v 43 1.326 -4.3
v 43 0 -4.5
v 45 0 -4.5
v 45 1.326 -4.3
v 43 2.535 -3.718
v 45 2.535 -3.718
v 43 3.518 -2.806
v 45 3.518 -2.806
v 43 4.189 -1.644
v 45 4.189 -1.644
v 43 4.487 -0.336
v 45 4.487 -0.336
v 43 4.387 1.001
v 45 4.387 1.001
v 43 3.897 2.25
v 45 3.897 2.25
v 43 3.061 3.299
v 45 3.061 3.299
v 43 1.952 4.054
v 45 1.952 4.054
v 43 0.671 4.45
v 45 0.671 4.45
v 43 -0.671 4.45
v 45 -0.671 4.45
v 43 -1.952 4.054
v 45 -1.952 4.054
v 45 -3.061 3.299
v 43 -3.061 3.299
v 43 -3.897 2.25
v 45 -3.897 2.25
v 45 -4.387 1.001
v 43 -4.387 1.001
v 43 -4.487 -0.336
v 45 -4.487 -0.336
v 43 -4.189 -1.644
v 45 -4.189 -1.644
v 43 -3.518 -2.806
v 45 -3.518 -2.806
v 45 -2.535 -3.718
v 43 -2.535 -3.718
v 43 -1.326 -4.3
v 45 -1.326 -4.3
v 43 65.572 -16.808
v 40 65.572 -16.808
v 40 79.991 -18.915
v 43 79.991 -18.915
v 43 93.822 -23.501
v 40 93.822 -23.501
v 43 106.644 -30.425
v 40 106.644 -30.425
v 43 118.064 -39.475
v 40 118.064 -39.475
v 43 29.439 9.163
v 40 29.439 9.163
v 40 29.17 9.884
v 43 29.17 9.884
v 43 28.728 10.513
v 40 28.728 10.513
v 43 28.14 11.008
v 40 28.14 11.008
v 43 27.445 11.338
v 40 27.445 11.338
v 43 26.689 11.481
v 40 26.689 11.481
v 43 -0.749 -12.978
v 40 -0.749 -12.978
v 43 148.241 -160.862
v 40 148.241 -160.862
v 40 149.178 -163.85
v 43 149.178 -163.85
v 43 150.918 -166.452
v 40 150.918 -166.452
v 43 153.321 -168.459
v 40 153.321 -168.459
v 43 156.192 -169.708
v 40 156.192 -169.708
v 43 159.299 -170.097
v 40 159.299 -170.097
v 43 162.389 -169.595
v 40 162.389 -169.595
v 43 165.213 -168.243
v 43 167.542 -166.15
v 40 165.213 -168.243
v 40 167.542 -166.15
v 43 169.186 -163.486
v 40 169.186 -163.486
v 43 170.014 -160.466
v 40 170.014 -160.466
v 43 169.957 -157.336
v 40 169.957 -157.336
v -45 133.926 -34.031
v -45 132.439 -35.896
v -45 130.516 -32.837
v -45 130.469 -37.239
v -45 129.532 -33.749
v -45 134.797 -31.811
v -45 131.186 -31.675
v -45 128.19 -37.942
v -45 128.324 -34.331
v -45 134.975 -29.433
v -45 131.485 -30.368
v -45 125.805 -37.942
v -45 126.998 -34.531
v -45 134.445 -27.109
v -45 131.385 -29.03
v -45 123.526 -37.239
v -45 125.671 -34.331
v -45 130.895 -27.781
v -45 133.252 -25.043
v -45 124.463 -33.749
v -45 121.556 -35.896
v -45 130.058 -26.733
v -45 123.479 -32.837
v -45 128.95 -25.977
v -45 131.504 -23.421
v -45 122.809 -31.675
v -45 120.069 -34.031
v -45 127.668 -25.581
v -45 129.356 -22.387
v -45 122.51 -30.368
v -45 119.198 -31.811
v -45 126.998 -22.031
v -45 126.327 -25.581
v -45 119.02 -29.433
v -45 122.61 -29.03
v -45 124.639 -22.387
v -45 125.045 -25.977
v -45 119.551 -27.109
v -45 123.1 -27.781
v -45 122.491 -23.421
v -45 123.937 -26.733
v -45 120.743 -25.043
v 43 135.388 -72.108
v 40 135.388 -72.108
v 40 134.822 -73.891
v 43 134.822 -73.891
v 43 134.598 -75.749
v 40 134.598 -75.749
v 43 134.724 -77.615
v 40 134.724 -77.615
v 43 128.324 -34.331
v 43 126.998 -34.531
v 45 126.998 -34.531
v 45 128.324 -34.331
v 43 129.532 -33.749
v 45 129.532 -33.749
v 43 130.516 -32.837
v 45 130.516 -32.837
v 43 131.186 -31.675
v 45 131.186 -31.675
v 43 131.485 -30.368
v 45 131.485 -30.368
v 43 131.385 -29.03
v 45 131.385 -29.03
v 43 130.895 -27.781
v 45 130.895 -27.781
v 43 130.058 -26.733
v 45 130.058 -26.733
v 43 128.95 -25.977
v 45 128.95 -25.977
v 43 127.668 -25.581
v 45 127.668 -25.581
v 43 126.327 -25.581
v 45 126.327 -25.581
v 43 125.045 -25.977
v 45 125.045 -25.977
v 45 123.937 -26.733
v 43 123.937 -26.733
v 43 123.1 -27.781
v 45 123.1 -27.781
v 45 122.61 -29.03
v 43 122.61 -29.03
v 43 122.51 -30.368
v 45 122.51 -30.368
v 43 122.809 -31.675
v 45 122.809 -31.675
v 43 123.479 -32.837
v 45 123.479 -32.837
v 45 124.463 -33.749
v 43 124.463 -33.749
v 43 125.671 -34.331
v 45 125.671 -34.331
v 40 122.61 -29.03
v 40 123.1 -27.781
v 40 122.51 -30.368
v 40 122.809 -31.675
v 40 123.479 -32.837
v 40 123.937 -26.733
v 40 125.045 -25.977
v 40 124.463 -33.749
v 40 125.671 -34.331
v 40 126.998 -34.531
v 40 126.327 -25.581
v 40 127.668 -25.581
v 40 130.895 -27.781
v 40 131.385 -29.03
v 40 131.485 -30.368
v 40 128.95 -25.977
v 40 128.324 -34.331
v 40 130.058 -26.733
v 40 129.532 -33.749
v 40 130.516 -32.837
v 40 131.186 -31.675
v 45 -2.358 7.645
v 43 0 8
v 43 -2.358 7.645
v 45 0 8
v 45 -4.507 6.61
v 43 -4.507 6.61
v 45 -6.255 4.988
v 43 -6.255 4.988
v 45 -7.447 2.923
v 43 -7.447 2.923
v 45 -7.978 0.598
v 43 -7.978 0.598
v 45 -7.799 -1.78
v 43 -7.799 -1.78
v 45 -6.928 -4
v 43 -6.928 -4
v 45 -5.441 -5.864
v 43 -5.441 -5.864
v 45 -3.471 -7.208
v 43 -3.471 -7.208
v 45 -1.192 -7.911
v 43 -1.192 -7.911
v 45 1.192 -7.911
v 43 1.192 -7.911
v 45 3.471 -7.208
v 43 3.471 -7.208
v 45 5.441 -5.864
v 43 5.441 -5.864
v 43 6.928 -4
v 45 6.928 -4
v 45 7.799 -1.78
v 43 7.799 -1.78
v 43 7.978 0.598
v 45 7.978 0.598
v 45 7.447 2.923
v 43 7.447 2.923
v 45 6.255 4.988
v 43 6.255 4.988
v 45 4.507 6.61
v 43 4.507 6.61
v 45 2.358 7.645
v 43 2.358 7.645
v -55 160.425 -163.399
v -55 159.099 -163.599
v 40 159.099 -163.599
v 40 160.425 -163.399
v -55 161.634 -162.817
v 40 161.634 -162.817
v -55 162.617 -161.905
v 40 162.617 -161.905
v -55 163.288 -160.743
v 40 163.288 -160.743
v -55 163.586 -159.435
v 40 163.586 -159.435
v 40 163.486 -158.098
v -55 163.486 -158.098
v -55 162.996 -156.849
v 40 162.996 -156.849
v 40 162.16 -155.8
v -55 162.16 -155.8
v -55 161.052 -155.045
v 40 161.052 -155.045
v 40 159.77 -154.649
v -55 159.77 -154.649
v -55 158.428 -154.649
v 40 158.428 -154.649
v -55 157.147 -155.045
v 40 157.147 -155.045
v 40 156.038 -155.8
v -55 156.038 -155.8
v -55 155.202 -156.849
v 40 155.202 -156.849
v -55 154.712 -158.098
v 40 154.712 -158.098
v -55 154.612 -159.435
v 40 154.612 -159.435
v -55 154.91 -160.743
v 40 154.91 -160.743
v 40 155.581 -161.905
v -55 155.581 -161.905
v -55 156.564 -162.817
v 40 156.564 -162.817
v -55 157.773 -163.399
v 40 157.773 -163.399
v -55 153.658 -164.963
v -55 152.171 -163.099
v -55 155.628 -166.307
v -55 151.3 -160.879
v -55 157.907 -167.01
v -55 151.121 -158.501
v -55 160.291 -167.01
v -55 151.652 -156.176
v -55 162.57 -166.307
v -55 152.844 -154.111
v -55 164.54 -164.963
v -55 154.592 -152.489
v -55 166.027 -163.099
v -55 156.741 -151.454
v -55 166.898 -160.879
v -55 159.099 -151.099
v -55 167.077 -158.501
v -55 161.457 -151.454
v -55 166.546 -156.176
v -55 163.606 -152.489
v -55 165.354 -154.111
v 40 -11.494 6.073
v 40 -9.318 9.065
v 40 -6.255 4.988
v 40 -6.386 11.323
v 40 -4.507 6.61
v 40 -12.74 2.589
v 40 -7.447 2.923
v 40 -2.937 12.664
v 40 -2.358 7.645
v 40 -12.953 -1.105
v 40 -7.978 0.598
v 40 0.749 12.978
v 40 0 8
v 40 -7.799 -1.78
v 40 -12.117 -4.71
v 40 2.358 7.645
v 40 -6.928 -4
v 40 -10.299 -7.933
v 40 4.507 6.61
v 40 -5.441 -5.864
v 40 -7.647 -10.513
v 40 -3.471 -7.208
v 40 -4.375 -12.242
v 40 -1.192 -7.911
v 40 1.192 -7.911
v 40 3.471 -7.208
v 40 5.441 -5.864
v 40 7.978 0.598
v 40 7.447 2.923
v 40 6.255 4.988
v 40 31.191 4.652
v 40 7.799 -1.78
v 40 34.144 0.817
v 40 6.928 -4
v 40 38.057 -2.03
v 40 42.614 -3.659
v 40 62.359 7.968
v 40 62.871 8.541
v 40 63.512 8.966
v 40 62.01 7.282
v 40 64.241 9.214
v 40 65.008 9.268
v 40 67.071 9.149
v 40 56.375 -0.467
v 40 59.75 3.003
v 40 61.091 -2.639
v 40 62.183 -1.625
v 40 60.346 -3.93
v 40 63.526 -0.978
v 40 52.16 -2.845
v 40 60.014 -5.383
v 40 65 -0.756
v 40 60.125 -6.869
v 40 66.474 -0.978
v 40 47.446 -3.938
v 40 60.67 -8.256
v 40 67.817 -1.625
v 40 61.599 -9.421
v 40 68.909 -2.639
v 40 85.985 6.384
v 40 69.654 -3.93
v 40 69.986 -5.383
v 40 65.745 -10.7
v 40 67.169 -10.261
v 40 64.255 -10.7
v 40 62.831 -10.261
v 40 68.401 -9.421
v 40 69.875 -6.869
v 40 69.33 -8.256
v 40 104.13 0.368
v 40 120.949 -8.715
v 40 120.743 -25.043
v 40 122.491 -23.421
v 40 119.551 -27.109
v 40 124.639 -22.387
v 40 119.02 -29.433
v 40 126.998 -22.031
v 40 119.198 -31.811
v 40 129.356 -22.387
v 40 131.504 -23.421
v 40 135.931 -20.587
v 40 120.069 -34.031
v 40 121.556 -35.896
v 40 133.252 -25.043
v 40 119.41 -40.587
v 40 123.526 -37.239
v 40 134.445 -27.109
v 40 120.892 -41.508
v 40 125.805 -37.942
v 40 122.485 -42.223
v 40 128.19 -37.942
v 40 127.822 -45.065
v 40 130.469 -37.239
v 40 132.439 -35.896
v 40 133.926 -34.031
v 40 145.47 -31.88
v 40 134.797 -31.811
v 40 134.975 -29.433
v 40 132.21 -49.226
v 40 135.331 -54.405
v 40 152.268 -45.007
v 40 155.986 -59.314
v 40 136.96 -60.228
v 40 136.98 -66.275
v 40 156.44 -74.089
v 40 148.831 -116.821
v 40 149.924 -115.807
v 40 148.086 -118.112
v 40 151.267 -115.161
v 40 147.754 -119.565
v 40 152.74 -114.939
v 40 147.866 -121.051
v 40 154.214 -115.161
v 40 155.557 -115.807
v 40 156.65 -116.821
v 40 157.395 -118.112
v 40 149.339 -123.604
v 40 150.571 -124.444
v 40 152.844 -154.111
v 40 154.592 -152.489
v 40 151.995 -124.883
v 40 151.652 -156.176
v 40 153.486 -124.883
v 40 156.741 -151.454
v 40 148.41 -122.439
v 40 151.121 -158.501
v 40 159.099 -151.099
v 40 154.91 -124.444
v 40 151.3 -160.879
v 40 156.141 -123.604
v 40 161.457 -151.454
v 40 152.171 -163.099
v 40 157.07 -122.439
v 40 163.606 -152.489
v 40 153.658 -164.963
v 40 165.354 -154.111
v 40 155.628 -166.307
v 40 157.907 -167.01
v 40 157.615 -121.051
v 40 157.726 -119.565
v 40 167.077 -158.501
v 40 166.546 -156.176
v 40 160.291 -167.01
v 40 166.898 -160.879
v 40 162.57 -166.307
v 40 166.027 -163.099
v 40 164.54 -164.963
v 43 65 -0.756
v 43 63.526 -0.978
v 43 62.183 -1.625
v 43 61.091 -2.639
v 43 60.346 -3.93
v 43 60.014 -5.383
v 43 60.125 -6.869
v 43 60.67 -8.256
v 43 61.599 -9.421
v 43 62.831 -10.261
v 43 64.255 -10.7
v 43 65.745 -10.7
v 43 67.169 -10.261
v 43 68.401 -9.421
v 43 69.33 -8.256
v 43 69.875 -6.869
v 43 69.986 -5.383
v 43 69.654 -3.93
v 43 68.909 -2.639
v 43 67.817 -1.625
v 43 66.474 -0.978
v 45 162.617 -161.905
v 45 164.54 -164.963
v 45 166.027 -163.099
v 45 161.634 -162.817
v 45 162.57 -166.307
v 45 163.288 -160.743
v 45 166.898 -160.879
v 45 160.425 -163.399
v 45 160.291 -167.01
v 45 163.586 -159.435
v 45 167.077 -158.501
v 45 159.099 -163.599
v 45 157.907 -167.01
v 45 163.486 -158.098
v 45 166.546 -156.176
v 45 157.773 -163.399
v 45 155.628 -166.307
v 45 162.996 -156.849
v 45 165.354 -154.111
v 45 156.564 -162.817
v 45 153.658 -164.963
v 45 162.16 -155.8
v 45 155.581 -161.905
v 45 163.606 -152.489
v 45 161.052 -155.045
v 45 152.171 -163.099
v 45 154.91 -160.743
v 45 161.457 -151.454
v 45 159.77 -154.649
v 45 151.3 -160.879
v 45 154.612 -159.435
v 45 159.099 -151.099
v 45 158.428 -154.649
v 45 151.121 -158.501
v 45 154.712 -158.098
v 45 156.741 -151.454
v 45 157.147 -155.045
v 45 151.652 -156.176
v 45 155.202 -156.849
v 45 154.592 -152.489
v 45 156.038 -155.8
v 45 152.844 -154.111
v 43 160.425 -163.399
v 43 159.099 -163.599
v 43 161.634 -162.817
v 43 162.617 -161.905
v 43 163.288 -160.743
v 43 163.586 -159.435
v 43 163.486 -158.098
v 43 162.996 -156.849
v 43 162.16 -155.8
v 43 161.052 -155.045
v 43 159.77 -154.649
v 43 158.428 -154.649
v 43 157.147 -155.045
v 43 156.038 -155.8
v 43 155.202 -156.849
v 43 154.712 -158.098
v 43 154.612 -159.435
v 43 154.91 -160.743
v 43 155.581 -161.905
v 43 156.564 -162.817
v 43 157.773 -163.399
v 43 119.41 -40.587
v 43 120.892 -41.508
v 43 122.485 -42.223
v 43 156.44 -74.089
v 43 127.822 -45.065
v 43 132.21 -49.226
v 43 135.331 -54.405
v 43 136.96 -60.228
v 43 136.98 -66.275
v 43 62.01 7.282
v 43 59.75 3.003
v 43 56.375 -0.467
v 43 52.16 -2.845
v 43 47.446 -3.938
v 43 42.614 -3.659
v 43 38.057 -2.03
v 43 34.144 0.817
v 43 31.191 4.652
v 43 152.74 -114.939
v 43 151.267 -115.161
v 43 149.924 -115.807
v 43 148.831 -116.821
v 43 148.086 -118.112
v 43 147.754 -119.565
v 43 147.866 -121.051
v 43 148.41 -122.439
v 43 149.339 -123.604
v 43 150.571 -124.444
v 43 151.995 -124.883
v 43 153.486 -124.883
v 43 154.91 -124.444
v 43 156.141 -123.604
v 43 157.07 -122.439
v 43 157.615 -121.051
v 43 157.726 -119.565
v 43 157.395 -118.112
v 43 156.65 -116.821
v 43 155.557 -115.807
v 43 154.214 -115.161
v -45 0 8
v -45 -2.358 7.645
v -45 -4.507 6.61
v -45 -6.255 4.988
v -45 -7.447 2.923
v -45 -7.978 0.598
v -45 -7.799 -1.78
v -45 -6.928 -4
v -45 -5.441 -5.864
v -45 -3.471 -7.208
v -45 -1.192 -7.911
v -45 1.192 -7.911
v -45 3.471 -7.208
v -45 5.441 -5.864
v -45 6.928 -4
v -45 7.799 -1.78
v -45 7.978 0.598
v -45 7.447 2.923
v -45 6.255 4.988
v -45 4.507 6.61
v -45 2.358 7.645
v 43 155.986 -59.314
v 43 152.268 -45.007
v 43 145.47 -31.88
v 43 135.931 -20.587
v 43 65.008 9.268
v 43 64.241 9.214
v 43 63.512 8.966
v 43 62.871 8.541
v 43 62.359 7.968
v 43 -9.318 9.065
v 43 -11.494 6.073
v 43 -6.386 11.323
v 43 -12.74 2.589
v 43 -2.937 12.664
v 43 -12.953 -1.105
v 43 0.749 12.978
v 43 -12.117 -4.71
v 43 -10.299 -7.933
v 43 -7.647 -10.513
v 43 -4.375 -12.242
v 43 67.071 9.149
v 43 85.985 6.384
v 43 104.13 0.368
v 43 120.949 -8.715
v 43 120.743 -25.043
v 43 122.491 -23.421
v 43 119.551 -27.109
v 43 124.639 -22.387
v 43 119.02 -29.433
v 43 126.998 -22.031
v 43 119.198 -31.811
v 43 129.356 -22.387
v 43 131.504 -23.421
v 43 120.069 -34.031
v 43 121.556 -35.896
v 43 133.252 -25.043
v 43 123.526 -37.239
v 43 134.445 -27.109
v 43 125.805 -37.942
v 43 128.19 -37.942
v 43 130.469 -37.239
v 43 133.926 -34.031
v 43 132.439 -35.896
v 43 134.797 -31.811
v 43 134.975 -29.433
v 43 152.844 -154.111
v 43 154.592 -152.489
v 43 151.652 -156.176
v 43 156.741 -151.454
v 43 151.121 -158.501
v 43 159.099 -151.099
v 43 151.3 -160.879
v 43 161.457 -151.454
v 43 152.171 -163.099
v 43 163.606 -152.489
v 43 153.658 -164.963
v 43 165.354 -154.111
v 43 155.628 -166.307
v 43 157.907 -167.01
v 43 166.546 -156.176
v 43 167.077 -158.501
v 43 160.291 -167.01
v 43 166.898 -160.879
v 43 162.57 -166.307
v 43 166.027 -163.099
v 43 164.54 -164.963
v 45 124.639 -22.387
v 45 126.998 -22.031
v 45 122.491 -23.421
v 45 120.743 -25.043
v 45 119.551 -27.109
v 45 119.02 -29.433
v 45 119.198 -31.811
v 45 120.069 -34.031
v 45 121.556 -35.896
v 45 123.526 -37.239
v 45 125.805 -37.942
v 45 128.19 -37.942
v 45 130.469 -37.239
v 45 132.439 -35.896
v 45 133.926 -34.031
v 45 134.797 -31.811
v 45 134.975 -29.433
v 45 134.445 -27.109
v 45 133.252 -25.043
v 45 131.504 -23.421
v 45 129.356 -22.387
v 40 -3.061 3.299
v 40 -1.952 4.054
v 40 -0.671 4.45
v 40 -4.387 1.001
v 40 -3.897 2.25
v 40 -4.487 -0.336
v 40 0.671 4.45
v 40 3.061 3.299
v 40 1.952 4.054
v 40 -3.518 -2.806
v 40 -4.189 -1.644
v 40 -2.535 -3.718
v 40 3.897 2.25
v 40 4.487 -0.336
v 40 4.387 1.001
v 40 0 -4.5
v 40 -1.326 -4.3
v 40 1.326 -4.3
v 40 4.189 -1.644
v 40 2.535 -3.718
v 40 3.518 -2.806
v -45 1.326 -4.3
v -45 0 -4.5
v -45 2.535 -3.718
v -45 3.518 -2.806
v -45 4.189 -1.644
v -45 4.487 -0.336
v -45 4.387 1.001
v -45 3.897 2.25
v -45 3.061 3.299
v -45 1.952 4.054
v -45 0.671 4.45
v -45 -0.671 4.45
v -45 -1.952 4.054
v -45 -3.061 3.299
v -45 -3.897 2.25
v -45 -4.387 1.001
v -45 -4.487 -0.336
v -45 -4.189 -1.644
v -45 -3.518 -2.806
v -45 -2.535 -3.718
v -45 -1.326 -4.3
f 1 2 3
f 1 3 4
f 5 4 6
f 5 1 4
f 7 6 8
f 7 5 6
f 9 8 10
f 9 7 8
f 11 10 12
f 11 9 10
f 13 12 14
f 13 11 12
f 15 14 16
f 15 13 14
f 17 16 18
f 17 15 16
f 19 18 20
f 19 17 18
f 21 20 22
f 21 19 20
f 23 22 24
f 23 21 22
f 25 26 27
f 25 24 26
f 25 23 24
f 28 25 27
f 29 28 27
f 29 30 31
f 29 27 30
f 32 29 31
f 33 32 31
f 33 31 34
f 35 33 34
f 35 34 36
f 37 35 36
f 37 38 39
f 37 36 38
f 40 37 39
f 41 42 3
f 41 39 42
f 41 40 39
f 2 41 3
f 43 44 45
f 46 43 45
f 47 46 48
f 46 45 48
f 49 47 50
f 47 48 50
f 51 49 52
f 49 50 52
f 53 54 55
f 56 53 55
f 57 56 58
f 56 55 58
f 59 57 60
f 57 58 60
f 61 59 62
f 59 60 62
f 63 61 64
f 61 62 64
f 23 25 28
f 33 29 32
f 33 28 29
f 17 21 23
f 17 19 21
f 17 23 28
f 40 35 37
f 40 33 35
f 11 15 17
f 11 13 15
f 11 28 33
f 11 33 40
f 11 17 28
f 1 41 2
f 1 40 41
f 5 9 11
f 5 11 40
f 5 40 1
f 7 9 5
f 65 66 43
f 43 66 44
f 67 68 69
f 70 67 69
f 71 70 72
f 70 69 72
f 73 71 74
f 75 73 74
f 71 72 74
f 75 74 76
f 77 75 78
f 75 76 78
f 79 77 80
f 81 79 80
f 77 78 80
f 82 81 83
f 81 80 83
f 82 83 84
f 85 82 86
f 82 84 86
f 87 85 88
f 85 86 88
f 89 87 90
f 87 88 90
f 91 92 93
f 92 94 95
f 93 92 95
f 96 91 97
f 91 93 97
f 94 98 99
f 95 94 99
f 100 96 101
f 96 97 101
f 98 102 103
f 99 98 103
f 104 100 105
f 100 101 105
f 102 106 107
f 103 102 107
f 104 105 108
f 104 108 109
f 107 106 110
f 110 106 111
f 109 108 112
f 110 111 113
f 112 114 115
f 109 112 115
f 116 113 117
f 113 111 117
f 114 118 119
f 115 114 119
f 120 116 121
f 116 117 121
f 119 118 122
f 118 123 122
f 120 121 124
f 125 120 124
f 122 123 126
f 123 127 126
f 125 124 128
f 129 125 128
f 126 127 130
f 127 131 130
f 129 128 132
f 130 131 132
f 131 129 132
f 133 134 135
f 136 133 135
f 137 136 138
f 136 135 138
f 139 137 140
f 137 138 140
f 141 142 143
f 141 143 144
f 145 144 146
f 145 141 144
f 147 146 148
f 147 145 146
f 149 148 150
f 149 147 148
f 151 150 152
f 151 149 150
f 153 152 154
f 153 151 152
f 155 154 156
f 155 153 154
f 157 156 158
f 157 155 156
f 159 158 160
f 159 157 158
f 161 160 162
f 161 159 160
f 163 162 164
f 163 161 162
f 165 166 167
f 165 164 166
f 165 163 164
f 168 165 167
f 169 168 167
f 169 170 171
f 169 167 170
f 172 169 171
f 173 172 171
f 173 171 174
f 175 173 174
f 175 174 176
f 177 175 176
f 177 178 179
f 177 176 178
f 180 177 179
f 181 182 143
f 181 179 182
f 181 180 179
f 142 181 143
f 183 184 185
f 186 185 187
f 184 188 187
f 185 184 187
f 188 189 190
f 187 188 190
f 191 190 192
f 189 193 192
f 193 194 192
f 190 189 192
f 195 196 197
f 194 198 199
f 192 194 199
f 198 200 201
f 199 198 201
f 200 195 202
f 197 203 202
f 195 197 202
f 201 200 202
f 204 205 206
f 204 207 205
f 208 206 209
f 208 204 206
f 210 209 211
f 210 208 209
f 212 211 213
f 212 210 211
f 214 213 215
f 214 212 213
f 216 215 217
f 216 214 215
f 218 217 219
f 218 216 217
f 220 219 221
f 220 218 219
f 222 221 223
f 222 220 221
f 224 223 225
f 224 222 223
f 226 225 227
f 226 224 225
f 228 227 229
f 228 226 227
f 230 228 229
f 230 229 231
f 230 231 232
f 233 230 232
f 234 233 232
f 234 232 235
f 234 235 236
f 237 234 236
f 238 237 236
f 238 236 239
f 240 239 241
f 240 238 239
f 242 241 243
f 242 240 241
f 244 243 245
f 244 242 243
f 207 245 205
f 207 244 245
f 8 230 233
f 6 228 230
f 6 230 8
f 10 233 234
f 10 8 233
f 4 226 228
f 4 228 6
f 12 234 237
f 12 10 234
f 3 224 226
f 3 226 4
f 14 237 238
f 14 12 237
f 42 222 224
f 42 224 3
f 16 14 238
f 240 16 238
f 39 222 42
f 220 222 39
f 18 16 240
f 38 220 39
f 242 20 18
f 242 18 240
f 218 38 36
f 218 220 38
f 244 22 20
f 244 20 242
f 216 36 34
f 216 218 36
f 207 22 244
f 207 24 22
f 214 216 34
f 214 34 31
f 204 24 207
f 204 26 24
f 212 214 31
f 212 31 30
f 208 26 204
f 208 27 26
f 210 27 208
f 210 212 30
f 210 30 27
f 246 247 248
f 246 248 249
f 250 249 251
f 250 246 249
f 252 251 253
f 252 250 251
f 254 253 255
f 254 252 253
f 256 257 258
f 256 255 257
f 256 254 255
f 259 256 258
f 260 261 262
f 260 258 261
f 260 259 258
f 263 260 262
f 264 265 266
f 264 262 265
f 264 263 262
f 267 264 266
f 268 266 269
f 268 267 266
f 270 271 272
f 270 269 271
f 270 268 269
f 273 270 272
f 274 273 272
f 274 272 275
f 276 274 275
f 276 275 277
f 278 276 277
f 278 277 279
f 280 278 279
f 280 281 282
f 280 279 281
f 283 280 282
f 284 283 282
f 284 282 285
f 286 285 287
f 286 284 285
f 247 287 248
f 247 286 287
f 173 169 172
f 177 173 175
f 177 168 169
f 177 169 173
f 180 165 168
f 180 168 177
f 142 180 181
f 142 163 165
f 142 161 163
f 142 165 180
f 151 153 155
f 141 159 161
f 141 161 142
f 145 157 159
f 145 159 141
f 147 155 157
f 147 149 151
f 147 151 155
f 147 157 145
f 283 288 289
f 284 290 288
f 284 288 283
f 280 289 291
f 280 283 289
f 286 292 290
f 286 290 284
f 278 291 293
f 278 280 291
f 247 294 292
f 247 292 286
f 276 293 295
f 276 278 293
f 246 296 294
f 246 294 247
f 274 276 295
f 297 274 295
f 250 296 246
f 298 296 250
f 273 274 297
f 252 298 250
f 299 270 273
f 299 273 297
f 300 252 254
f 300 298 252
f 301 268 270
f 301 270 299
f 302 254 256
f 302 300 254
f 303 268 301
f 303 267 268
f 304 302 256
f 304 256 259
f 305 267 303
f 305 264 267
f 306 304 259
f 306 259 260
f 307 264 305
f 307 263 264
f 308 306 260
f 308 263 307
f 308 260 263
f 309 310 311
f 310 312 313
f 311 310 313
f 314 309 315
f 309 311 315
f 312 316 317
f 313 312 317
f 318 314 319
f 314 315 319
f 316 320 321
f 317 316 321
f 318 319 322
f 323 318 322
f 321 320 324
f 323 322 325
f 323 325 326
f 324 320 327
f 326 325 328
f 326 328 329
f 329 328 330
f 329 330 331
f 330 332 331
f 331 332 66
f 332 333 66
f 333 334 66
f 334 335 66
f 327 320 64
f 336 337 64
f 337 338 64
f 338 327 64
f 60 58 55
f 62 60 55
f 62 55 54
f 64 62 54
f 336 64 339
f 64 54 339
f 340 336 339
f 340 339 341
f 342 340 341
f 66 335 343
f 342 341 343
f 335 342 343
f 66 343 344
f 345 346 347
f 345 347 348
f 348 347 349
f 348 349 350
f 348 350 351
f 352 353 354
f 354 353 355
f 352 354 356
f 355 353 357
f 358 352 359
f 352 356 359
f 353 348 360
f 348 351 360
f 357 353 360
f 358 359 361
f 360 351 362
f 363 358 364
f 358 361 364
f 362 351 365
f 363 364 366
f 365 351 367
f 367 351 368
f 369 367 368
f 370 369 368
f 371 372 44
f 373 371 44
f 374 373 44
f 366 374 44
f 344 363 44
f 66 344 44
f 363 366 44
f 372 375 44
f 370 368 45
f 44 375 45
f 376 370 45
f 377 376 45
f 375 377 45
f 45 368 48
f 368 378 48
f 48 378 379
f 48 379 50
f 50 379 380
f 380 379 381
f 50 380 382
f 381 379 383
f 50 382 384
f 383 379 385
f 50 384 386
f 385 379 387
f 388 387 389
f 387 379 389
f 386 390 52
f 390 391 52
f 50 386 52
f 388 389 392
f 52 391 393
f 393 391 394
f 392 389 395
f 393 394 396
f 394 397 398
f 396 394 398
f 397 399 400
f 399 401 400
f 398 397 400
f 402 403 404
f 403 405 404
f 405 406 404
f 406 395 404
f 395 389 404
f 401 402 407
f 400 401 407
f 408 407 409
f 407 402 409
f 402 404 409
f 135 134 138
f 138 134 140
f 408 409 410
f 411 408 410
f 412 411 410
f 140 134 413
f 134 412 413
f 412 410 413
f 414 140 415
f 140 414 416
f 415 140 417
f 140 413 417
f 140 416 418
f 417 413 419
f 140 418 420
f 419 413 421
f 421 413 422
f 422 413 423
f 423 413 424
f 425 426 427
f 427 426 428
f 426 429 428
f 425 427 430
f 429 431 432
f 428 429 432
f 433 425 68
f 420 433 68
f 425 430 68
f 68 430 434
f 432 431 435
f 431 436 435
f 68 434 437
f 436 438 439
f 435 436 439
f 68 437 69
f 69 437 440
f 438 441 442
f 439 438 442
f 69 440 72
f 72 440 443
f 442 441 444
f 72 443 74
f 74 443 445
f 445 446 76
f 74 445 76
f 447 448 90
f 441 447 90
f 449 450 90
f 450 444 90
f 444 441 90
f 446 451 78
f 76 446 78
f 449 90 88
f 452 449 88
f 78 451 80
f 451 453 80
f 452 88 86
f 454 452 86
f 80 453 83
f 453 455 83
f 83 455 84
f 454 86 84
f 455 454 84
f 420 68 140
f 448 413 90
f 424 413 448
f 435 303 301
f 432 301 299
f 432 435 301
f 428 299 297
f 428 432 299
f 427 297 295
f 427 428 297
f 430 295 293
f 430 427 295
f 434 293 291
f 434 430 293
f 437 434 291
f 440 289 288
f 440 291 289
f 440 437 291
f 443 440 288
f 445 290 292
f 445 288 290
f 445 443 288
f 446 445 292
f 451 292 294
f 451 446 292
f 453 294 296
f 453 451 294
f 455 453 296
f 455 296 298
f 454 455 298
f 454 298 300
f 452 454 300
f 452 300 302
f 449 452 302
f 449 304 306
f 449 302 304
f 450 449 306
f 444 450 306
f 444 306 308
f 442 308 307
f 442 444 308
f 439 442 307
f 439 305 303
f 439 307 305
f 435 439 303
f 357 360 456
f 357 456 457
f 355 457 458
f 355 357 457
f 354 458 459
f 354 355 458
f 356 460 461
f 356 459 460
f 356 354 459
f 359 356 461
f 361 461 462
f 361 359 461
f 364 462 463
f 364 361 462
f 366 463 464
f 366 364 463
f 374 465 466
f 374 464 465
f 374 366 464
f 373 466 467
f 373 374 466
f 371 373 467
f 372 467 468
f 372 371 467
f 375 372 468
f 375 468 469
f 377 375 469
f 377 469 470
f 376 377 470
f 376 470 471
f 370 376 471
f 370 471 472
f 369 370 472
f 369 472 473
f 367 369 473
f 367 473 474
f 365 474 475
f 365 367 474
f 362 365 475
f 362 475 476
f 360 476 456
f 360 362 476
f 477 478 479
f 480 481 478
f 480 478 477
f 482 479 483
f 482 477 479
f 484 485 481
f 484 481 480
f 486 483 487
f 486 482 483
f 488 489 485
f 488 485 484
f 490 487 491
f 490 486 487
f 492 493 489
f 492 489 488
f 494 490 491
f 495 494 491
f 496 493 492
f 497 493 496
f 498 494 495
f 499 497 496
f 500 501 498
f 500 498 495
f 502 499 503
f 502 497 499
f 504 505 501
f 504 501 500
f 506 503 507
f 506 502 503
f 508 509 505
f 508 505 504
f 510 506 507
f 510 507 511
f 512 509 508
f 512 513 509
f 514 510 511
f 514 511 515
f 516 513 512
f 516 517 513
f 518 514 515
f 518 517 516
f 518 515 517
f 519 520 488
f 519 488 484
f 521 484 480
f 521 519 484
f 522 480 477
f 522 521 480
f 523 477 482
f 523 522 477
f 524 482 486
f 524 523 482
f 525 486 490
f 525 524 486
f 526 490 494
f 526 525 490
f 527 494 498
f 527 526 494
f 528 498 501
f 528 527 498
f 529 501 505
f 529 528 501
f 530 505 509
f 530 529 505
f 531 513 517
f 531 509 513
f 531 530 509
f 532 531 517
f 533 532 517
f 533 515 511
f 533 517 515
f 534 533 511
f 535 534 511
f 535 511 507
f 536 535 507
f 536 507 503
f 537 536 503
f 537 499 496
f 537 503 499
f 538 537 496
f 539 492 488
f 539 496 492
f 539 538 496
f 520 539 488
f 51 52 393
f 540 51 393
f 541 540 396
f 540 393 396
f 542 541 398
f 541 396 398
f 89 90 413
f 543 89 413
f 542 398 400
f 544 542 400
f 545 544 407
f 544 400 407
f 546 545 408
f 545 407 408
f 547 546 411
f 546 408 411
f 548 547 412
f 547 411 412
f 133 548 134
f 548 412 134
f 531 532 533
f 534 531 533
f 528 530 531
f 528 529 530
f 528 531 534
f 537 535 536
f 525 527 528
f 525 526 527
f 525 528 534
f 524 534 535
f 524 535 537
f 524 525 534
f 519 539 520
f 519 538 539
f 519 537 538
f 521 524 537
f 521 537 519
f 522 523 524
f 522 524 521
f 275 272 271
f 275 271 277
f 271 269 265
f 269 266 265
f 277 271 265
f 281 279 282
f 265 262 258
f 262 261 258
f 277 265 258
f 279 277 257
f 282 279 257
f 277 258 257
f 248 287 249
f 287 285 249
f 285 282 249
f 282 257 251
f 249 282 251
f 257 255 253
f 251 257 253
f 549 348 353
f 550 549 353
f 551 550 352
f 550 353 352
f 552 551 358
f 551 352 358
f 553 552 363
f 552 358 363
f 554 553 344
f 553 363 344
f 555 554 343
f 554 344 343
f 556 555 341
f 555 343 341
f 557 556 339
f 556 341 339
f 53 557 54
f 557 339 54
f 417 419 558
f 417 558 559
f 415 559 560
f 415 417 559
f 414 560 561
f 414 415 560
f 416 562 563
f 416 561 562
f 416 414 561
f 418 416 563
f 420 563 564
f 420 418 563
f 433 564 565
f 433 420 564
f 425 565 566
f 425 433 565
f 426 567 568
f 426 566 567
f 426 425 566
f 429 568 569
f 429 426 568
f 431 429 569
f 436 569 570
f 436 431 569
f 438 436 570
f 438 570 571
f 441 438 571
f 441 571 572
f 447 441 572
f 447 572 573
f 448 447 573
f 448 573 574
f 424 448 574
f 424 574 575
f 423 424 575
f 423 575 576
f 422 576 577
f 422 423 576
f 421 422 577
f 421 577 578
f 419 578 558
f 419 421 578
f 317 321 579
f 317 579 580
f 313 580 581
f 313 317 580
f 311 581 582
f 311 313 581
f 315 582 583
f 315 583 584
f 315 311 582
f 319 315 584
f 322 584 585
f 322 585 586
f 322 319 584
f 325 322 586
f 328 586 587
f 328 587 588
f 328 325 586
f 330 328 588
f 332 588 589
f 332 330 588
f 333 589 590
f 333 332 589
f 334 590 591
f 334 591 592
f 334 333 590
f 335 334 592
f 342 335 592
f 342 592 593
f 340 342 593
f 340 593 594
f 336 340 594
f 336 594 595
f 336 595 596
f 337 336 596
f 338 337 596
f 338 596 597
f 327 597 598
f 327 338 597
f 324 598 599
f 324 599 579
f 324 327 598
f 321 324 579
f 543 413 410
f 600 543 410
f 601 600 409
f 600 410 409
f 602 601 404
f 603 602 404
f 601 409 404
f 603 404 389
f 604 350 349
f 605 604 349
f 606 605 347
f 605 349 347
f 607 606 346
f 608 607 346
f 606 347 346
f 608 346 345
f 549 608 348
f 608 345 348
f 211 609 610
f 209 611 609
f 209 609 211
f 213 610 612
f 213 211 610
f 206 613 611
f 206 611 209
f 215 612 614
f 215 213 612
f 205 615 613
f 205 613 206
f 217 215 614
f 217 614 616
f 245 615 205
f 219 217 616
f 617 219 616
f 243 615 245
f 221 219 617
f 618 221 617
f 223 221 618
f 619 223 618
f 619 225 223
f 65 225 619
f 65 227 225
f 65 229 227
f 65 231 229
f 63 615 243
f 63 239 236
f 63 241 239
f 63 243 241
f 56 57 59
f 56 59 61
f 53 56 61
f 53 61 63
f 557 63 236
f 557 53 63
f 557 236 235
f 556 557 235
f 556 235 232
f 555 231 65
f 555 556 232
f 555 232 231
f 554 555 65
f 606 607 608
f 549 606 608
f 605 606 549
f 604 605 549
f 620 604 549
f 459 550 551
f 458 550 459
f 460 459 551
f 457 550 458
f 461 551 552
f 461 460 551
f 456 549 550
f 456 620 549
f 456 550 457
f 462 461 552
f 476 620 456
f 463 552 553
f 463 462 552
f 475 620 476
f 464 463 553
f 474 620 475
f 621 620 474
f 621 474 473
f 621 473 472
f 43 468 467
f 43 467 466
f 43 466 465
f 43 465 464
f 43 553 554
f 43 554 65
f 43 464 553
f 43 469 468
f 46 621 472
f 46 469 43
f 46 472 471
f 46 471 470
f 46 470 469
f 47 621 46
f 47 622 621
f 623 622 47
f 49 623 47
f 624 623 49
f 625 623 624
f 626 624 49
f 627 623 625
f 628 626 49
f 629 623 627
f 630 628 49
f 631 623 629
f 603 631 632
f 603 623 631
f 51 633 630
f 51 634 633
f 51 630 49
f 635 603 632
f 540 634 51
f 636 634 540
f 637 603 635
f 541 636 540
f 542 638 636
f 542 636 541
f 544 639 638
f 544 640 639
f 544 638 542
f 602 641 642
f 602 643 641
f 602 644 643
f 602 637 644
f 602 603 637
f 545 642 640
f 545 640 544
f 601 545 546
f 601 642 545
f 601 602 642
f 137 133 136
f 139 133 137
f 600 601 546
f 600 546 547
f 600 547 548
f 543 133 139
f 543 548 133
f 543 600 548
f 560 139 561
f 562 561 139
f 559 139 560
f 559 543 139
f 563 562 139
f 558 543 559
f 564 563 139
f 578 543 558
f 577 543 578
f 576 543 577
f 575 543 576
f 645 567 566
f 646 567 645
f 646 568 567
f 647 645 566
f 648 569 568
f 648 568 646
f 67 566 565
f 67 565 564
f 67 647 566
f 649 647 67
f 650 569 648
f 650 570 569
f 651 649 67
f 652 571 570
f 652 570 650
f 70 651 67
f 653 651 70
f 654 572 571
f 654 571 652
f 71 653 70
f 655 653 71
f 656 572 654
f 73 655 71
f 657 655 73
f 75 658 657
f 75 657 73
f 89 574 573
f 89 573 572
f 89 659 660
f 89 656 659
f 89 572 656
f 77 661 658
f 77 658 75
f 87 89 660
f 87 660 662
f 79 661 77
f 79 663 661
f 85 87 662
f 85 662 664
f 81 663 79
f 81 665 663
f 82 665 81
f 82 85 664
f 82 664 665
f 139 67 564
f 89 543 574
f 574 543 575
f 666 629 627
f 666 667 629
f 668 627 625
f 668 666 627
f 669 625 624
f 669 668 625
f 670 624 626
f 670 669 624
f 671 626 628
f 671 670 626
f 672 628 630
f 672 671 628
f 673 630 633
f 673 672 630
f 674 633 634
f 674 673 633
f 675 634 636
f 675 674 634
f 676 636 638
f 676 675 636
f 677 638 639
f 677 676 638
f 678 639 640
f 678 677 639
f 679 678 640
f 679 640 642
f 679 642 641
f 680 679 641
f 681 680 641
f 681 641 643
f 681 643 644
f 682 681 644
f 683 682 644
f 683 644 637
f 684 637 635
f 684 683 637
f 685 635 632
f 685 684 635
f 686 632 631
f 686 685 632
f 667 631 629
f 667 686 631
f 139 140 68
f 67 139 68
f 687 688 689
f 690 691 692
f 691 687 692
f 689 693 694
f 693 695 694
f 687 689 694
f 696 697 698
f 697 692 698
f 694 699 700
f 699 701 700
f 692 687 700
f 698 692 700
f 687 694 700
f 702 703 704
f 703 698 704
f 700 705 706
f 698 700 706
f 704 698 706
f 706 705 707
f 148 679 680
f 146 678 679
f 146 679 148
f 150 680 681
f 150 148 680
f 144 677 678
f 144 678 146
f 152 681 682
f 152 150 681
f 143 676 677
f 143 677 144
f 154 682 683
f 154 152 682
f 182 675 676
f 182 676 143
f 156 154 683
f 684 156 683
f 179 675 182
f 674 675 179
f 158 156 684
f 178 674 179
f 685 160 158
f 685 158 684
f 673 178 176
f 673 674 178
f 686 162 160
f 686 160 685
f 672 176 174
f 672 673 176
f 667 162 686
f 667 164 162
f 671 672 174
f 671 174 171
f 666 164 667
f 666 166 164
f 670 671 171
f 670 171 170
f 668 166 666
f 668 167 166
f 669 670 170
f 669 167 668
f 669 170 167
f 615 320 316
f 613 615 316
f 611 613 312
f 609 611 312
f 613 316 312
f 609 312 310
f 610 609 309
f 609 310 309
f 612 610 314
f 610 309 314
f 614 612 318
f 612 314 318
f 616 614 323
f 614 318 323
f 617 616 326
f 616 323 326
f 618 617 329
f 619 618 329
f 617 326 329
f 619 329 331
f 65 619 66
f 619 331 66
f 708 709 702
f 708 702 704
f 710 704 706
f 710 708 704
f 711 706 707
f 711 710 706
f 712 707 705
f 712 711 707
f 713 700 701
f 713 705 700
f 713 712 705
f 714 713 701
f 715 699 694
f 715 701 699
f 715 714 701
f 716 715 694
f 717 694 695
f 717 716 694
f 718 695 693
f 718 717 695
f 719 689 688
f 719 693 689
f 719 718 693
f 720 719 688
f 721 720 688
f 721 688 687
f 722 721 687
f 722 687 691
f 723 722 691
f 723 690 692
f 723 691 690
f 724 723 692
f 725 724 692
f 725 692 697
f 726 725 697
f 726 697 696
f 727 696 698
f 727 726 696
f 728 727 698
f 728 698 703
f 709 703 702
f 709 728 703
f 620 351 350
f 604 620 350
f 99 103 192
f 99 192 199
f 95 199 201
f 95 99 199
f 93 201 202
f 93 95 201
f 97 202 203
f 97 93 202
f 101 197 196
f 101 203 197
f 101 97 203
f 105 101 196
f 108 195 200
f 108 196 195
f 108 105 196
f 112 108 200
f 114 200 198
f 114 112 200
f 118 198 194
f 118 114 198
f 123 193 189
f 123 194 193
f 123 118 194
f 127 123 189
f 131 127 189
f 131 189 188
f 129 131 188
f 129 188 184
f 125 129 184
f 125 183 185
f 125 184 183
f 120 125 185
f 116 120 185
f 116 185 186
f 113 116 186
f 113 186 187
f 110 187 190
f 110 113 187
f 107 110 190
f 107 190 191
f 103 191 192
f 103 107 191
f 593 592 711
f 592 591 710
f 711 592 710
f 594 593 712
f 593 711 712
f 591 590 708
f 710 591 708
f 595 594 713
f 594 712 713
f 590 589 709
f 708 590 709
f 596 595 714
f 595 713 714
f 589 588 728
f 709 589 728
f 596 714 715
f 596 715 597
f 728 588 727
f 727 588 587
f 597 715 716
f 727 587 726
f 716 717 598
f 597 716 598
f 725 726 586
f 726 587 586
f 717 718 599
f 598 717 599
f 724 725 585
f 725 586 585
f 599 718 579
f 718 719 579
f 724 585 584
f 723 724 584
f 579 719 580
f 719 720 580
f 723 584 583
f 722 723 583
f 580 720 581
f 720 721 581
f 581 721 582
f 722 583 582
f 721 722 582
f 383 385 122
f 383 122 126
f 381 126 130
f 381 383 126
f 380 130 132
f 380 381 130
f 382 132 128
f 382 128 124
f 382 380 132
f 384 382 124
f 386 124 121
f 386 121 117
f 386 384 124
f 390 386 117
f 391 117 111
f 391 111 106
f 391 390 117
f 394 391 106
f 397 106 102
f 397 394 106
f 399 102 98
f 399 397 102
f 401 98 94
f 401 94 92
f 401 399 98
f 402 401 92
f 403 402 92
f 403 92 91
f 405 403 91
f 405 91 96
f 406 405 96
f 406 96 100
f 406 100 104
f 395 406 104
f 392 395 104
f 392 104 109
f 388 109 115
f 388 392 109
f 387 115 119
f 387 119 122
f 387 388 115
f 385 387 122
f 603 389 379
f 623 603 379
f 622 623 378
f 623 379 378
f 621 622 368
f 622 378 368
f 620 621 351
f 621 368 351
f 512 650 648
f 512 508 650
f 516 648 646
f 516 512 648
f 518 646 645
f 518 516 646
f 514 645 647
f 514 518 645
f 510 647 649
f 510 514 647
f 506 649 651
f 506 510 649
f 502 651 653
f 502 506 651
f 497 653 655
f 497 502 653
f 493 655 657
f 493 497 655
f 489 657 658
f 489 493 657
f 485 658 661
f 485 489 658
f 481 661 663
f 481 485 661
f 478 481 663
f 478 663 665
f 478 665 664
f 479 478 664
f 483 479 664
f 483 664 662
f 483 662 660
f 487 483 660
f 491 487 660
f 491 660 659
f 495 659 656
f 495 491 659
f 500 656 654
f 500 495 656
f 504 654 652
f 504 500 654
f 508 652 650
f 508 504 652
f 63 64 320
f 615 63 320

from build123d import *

# Parameters (mm, degrees)
SKETCH1_R                   = 8
MOUNT_TUBES_DEPTH           = 45
MOUNT_TUBES_2_DEPTH         = 45
MOUNT_TUBES_3_DEPTH         = 45
SKETCH2_R                   = 8
EXTEND_TUBE_1_DEPTH         = 10
MOUNT_TUBE_HOLES_DEPTH      = 243.629694853
MOUNT_TUBE_HOLES_DEPTH_BACK = 243.629694853
SKETCH3_R                   = 4.5
SIDE_PLATE_RH_DEPTH         = 3
MOTOR_MOUNT_HOLES_R         = 5
MOTOR_MOUNT_HOLES_F_DEPTH   = 247.763767871


with BuildPart() as part:
    # Sketch1 → mount tubes (new, symmetric)
    with BuildSketch(Plane(origin=(0, 0, 0), x_dir=(0, 0, -1), z_dir=(1, 0, 0))):
        with Locations(Location((0, 0, 0), (0, 0, 180))):
            Circle(SKETCH1_R)
    extrude(amount=MOUNT_TUBES_DEPTH, both=True)


with BuildPart() as body_2:
    # Sketch1 → mount tubes 2 (new, symmetric)
    with BuildSketch(Plane(origin=(0, 0, 0), x_dir=(0, 0, -1), z_dir=(1, 0, 0))):
        with Locations(Location((30.031235259, 126.997538987, 0), (0, 0, 180))):
            Circle(SKETCH1_R)
    extrude(amount=MOUNT_TUBES_2_DEPTH, both=True)


with BuildPart() as body_3:
    # Sketch1 → mount tubes 3 (new, symmetric)
    with BuildSketch(Plane(origin=(0, 0, 0), x_dir=(0, 0, -1), z_dir=(1, 0, 0))):
        with Locations(Location((159.099025767, 159.099025767, 0), (0, 0, 180))):
            Circle(SKETCH1_R)
    extrude(amount=MOUNT_TUBES_3_DEPTH, both=True)

    # Sketch2 → extend tube 1 (add)
    with BuildSketch(Plane.ZY.offset(45)):
        with Locations((-159.099025767, 159.099025767)):
            Circle(SKETCH2_R)
    extrude(amount=EXTEND_TUBE_1_DEPTH)


with BuildPart() as mount_tube_holes_tool:
    # Sketch3 → mount tube holes (new, two sides: drawn at the far end of the back side and taken through both)
    with BuildSketch(Plane(origin=(0, 0, 0), x_dir=(0, 0, -1), z_dir=(1, 0, 0)).offset(-MOUNT_TUBE_HOLES_DEPTH_BACK)):
        Circle(SKETCH3_R)
        with Locations((30.031235259, 126.997538987)):
            Circle(SKETCH3_R)
        with Locations((159.099025767, 159.099025767)):
            Circle(SKETCH3_R)
    extrude(amount=MOUNT_TUBE_HOLES_DEPTH + MOUNT_TUBE_HOLES_DEPTH_BACK)


with BuildPart() as part_1:
    add(part.part)

    # mount tube holes: cut by mount_tube_holes_tool
    add(mount_tube_holes_tool.part, mode=Mode.SUBTRACT)



with BuildPart() as body_2_1:
    add(body_2.part)

    # mount tube holes: cut by mount_tube_holes_tool
    add(mount_tube_holes_tool.part, mode=Mode.SUBTRACT)


with BuildPart() as body_3_1:
    add(body_3.part)

    # mount tube holes: cut by mount_tube_holes_tool
    add(mount_tube_holes_tool.part, mode=Mode.SUBTRACT)


with BuildPart() as part_2:
    add(part_1.part)

    add(body_2_1.part)  # Side plate RH merges body 2

    add(body_3_1.part)  # Side plate RH merges body 3
    # Sketch4 → Side plate RH (add)
    with BuildSketch(Plane(origin=(40, 0, 0), x_dir=(0, 0, -1), z_dir=(1, 0, 0))):
        with BuildLine():
            Line((12.978386159, -0.749328179), (16.807561824, 65.572107296))
            ThreePointArc((16.807561824, 65.572107296), (23.501336664, 93.821843391), (39.475404328, 118.064025087))
            ThreePointArc((39.475404328, 118.064025087), (41.072624736, 120.135489845), (42.222827025, 122.484769304))
            ThreePointArc((42.222827025, 122.484769304), (54.40469235, 135.330973688), (72.108350397, 135.388433283))
            ThreePointArc((72.108350397, 135.388433283), (74.814895184, 134.666747236), (77.615418999, 134.724034171))
            Line((77.615418999, 134.724034171), (160.862063178, 148.241231374))
            ThreePointArc((160.862063178, 148.241231374), (169.95682016, 160.862063178), (157.335988356, 169.95682016))
            Line((157.335988356, 169.95682016), (74.089344178, 156.439622958))
            ThreePointArc((74.089344178, 156.439622958), (45.006724073, 152.267651322), (20.587066191, 135.931052888))
            ThreePointArc((20.587066191, 135.931052888), (-0.368139217, 104.129516319), (-9.149210493, 67.070763654))
            Line((-9.149210493, 67.070763654), (-9.268320599, 65.007773101))
            ThreePointArc((-9.268320599, 65.007773101), (-8.774360407, 63.178125859), (-7.282312147, 62.009623531))
            ThreePointArc((-7.282312147, 62.009623531), (3.971735746, 45.020109305), (-9.16284655, 29.438712206))
            ThreePointArc((-9.16284655, 29.438712206), (-10.779462777, 28.449693665), (-11.480714014, 26.689053894))
            Line((-11.480714014, 26.689053894), (-12.978386159, 0.749328179))
            ThreePointArc((-12.978386159, 0.749328179), (-0.749328179, -12.978386159), (12.978386159, -0.749328179))
        make_face()
    extrude(amount=SIDE_PLATE_RH_DEPTH)

    # motor mount holes → motor mount holes f (cut, through all)
    with BuildSketch(Plane(origin=(0, 0, 0), x_dir=(0, 0, -1), z_dir=(1, 0, 0))):
        with Locations(Location((119.938657263, 152.740349945, 0), (0, 0, 180))):
            Circle(MOTOR_MOUNT_HOLES_R)
        with Locations(Location((5.756211189, 65, 0), (0, 0, 180))):
            Circle(MOTOR_MOUNT_HOLES_R)
    extrude(amount=MOTOR_MOUNT_HOLES_F_DEPTH, mode=Mode.SUBTRACT)


solid = part_2.part
